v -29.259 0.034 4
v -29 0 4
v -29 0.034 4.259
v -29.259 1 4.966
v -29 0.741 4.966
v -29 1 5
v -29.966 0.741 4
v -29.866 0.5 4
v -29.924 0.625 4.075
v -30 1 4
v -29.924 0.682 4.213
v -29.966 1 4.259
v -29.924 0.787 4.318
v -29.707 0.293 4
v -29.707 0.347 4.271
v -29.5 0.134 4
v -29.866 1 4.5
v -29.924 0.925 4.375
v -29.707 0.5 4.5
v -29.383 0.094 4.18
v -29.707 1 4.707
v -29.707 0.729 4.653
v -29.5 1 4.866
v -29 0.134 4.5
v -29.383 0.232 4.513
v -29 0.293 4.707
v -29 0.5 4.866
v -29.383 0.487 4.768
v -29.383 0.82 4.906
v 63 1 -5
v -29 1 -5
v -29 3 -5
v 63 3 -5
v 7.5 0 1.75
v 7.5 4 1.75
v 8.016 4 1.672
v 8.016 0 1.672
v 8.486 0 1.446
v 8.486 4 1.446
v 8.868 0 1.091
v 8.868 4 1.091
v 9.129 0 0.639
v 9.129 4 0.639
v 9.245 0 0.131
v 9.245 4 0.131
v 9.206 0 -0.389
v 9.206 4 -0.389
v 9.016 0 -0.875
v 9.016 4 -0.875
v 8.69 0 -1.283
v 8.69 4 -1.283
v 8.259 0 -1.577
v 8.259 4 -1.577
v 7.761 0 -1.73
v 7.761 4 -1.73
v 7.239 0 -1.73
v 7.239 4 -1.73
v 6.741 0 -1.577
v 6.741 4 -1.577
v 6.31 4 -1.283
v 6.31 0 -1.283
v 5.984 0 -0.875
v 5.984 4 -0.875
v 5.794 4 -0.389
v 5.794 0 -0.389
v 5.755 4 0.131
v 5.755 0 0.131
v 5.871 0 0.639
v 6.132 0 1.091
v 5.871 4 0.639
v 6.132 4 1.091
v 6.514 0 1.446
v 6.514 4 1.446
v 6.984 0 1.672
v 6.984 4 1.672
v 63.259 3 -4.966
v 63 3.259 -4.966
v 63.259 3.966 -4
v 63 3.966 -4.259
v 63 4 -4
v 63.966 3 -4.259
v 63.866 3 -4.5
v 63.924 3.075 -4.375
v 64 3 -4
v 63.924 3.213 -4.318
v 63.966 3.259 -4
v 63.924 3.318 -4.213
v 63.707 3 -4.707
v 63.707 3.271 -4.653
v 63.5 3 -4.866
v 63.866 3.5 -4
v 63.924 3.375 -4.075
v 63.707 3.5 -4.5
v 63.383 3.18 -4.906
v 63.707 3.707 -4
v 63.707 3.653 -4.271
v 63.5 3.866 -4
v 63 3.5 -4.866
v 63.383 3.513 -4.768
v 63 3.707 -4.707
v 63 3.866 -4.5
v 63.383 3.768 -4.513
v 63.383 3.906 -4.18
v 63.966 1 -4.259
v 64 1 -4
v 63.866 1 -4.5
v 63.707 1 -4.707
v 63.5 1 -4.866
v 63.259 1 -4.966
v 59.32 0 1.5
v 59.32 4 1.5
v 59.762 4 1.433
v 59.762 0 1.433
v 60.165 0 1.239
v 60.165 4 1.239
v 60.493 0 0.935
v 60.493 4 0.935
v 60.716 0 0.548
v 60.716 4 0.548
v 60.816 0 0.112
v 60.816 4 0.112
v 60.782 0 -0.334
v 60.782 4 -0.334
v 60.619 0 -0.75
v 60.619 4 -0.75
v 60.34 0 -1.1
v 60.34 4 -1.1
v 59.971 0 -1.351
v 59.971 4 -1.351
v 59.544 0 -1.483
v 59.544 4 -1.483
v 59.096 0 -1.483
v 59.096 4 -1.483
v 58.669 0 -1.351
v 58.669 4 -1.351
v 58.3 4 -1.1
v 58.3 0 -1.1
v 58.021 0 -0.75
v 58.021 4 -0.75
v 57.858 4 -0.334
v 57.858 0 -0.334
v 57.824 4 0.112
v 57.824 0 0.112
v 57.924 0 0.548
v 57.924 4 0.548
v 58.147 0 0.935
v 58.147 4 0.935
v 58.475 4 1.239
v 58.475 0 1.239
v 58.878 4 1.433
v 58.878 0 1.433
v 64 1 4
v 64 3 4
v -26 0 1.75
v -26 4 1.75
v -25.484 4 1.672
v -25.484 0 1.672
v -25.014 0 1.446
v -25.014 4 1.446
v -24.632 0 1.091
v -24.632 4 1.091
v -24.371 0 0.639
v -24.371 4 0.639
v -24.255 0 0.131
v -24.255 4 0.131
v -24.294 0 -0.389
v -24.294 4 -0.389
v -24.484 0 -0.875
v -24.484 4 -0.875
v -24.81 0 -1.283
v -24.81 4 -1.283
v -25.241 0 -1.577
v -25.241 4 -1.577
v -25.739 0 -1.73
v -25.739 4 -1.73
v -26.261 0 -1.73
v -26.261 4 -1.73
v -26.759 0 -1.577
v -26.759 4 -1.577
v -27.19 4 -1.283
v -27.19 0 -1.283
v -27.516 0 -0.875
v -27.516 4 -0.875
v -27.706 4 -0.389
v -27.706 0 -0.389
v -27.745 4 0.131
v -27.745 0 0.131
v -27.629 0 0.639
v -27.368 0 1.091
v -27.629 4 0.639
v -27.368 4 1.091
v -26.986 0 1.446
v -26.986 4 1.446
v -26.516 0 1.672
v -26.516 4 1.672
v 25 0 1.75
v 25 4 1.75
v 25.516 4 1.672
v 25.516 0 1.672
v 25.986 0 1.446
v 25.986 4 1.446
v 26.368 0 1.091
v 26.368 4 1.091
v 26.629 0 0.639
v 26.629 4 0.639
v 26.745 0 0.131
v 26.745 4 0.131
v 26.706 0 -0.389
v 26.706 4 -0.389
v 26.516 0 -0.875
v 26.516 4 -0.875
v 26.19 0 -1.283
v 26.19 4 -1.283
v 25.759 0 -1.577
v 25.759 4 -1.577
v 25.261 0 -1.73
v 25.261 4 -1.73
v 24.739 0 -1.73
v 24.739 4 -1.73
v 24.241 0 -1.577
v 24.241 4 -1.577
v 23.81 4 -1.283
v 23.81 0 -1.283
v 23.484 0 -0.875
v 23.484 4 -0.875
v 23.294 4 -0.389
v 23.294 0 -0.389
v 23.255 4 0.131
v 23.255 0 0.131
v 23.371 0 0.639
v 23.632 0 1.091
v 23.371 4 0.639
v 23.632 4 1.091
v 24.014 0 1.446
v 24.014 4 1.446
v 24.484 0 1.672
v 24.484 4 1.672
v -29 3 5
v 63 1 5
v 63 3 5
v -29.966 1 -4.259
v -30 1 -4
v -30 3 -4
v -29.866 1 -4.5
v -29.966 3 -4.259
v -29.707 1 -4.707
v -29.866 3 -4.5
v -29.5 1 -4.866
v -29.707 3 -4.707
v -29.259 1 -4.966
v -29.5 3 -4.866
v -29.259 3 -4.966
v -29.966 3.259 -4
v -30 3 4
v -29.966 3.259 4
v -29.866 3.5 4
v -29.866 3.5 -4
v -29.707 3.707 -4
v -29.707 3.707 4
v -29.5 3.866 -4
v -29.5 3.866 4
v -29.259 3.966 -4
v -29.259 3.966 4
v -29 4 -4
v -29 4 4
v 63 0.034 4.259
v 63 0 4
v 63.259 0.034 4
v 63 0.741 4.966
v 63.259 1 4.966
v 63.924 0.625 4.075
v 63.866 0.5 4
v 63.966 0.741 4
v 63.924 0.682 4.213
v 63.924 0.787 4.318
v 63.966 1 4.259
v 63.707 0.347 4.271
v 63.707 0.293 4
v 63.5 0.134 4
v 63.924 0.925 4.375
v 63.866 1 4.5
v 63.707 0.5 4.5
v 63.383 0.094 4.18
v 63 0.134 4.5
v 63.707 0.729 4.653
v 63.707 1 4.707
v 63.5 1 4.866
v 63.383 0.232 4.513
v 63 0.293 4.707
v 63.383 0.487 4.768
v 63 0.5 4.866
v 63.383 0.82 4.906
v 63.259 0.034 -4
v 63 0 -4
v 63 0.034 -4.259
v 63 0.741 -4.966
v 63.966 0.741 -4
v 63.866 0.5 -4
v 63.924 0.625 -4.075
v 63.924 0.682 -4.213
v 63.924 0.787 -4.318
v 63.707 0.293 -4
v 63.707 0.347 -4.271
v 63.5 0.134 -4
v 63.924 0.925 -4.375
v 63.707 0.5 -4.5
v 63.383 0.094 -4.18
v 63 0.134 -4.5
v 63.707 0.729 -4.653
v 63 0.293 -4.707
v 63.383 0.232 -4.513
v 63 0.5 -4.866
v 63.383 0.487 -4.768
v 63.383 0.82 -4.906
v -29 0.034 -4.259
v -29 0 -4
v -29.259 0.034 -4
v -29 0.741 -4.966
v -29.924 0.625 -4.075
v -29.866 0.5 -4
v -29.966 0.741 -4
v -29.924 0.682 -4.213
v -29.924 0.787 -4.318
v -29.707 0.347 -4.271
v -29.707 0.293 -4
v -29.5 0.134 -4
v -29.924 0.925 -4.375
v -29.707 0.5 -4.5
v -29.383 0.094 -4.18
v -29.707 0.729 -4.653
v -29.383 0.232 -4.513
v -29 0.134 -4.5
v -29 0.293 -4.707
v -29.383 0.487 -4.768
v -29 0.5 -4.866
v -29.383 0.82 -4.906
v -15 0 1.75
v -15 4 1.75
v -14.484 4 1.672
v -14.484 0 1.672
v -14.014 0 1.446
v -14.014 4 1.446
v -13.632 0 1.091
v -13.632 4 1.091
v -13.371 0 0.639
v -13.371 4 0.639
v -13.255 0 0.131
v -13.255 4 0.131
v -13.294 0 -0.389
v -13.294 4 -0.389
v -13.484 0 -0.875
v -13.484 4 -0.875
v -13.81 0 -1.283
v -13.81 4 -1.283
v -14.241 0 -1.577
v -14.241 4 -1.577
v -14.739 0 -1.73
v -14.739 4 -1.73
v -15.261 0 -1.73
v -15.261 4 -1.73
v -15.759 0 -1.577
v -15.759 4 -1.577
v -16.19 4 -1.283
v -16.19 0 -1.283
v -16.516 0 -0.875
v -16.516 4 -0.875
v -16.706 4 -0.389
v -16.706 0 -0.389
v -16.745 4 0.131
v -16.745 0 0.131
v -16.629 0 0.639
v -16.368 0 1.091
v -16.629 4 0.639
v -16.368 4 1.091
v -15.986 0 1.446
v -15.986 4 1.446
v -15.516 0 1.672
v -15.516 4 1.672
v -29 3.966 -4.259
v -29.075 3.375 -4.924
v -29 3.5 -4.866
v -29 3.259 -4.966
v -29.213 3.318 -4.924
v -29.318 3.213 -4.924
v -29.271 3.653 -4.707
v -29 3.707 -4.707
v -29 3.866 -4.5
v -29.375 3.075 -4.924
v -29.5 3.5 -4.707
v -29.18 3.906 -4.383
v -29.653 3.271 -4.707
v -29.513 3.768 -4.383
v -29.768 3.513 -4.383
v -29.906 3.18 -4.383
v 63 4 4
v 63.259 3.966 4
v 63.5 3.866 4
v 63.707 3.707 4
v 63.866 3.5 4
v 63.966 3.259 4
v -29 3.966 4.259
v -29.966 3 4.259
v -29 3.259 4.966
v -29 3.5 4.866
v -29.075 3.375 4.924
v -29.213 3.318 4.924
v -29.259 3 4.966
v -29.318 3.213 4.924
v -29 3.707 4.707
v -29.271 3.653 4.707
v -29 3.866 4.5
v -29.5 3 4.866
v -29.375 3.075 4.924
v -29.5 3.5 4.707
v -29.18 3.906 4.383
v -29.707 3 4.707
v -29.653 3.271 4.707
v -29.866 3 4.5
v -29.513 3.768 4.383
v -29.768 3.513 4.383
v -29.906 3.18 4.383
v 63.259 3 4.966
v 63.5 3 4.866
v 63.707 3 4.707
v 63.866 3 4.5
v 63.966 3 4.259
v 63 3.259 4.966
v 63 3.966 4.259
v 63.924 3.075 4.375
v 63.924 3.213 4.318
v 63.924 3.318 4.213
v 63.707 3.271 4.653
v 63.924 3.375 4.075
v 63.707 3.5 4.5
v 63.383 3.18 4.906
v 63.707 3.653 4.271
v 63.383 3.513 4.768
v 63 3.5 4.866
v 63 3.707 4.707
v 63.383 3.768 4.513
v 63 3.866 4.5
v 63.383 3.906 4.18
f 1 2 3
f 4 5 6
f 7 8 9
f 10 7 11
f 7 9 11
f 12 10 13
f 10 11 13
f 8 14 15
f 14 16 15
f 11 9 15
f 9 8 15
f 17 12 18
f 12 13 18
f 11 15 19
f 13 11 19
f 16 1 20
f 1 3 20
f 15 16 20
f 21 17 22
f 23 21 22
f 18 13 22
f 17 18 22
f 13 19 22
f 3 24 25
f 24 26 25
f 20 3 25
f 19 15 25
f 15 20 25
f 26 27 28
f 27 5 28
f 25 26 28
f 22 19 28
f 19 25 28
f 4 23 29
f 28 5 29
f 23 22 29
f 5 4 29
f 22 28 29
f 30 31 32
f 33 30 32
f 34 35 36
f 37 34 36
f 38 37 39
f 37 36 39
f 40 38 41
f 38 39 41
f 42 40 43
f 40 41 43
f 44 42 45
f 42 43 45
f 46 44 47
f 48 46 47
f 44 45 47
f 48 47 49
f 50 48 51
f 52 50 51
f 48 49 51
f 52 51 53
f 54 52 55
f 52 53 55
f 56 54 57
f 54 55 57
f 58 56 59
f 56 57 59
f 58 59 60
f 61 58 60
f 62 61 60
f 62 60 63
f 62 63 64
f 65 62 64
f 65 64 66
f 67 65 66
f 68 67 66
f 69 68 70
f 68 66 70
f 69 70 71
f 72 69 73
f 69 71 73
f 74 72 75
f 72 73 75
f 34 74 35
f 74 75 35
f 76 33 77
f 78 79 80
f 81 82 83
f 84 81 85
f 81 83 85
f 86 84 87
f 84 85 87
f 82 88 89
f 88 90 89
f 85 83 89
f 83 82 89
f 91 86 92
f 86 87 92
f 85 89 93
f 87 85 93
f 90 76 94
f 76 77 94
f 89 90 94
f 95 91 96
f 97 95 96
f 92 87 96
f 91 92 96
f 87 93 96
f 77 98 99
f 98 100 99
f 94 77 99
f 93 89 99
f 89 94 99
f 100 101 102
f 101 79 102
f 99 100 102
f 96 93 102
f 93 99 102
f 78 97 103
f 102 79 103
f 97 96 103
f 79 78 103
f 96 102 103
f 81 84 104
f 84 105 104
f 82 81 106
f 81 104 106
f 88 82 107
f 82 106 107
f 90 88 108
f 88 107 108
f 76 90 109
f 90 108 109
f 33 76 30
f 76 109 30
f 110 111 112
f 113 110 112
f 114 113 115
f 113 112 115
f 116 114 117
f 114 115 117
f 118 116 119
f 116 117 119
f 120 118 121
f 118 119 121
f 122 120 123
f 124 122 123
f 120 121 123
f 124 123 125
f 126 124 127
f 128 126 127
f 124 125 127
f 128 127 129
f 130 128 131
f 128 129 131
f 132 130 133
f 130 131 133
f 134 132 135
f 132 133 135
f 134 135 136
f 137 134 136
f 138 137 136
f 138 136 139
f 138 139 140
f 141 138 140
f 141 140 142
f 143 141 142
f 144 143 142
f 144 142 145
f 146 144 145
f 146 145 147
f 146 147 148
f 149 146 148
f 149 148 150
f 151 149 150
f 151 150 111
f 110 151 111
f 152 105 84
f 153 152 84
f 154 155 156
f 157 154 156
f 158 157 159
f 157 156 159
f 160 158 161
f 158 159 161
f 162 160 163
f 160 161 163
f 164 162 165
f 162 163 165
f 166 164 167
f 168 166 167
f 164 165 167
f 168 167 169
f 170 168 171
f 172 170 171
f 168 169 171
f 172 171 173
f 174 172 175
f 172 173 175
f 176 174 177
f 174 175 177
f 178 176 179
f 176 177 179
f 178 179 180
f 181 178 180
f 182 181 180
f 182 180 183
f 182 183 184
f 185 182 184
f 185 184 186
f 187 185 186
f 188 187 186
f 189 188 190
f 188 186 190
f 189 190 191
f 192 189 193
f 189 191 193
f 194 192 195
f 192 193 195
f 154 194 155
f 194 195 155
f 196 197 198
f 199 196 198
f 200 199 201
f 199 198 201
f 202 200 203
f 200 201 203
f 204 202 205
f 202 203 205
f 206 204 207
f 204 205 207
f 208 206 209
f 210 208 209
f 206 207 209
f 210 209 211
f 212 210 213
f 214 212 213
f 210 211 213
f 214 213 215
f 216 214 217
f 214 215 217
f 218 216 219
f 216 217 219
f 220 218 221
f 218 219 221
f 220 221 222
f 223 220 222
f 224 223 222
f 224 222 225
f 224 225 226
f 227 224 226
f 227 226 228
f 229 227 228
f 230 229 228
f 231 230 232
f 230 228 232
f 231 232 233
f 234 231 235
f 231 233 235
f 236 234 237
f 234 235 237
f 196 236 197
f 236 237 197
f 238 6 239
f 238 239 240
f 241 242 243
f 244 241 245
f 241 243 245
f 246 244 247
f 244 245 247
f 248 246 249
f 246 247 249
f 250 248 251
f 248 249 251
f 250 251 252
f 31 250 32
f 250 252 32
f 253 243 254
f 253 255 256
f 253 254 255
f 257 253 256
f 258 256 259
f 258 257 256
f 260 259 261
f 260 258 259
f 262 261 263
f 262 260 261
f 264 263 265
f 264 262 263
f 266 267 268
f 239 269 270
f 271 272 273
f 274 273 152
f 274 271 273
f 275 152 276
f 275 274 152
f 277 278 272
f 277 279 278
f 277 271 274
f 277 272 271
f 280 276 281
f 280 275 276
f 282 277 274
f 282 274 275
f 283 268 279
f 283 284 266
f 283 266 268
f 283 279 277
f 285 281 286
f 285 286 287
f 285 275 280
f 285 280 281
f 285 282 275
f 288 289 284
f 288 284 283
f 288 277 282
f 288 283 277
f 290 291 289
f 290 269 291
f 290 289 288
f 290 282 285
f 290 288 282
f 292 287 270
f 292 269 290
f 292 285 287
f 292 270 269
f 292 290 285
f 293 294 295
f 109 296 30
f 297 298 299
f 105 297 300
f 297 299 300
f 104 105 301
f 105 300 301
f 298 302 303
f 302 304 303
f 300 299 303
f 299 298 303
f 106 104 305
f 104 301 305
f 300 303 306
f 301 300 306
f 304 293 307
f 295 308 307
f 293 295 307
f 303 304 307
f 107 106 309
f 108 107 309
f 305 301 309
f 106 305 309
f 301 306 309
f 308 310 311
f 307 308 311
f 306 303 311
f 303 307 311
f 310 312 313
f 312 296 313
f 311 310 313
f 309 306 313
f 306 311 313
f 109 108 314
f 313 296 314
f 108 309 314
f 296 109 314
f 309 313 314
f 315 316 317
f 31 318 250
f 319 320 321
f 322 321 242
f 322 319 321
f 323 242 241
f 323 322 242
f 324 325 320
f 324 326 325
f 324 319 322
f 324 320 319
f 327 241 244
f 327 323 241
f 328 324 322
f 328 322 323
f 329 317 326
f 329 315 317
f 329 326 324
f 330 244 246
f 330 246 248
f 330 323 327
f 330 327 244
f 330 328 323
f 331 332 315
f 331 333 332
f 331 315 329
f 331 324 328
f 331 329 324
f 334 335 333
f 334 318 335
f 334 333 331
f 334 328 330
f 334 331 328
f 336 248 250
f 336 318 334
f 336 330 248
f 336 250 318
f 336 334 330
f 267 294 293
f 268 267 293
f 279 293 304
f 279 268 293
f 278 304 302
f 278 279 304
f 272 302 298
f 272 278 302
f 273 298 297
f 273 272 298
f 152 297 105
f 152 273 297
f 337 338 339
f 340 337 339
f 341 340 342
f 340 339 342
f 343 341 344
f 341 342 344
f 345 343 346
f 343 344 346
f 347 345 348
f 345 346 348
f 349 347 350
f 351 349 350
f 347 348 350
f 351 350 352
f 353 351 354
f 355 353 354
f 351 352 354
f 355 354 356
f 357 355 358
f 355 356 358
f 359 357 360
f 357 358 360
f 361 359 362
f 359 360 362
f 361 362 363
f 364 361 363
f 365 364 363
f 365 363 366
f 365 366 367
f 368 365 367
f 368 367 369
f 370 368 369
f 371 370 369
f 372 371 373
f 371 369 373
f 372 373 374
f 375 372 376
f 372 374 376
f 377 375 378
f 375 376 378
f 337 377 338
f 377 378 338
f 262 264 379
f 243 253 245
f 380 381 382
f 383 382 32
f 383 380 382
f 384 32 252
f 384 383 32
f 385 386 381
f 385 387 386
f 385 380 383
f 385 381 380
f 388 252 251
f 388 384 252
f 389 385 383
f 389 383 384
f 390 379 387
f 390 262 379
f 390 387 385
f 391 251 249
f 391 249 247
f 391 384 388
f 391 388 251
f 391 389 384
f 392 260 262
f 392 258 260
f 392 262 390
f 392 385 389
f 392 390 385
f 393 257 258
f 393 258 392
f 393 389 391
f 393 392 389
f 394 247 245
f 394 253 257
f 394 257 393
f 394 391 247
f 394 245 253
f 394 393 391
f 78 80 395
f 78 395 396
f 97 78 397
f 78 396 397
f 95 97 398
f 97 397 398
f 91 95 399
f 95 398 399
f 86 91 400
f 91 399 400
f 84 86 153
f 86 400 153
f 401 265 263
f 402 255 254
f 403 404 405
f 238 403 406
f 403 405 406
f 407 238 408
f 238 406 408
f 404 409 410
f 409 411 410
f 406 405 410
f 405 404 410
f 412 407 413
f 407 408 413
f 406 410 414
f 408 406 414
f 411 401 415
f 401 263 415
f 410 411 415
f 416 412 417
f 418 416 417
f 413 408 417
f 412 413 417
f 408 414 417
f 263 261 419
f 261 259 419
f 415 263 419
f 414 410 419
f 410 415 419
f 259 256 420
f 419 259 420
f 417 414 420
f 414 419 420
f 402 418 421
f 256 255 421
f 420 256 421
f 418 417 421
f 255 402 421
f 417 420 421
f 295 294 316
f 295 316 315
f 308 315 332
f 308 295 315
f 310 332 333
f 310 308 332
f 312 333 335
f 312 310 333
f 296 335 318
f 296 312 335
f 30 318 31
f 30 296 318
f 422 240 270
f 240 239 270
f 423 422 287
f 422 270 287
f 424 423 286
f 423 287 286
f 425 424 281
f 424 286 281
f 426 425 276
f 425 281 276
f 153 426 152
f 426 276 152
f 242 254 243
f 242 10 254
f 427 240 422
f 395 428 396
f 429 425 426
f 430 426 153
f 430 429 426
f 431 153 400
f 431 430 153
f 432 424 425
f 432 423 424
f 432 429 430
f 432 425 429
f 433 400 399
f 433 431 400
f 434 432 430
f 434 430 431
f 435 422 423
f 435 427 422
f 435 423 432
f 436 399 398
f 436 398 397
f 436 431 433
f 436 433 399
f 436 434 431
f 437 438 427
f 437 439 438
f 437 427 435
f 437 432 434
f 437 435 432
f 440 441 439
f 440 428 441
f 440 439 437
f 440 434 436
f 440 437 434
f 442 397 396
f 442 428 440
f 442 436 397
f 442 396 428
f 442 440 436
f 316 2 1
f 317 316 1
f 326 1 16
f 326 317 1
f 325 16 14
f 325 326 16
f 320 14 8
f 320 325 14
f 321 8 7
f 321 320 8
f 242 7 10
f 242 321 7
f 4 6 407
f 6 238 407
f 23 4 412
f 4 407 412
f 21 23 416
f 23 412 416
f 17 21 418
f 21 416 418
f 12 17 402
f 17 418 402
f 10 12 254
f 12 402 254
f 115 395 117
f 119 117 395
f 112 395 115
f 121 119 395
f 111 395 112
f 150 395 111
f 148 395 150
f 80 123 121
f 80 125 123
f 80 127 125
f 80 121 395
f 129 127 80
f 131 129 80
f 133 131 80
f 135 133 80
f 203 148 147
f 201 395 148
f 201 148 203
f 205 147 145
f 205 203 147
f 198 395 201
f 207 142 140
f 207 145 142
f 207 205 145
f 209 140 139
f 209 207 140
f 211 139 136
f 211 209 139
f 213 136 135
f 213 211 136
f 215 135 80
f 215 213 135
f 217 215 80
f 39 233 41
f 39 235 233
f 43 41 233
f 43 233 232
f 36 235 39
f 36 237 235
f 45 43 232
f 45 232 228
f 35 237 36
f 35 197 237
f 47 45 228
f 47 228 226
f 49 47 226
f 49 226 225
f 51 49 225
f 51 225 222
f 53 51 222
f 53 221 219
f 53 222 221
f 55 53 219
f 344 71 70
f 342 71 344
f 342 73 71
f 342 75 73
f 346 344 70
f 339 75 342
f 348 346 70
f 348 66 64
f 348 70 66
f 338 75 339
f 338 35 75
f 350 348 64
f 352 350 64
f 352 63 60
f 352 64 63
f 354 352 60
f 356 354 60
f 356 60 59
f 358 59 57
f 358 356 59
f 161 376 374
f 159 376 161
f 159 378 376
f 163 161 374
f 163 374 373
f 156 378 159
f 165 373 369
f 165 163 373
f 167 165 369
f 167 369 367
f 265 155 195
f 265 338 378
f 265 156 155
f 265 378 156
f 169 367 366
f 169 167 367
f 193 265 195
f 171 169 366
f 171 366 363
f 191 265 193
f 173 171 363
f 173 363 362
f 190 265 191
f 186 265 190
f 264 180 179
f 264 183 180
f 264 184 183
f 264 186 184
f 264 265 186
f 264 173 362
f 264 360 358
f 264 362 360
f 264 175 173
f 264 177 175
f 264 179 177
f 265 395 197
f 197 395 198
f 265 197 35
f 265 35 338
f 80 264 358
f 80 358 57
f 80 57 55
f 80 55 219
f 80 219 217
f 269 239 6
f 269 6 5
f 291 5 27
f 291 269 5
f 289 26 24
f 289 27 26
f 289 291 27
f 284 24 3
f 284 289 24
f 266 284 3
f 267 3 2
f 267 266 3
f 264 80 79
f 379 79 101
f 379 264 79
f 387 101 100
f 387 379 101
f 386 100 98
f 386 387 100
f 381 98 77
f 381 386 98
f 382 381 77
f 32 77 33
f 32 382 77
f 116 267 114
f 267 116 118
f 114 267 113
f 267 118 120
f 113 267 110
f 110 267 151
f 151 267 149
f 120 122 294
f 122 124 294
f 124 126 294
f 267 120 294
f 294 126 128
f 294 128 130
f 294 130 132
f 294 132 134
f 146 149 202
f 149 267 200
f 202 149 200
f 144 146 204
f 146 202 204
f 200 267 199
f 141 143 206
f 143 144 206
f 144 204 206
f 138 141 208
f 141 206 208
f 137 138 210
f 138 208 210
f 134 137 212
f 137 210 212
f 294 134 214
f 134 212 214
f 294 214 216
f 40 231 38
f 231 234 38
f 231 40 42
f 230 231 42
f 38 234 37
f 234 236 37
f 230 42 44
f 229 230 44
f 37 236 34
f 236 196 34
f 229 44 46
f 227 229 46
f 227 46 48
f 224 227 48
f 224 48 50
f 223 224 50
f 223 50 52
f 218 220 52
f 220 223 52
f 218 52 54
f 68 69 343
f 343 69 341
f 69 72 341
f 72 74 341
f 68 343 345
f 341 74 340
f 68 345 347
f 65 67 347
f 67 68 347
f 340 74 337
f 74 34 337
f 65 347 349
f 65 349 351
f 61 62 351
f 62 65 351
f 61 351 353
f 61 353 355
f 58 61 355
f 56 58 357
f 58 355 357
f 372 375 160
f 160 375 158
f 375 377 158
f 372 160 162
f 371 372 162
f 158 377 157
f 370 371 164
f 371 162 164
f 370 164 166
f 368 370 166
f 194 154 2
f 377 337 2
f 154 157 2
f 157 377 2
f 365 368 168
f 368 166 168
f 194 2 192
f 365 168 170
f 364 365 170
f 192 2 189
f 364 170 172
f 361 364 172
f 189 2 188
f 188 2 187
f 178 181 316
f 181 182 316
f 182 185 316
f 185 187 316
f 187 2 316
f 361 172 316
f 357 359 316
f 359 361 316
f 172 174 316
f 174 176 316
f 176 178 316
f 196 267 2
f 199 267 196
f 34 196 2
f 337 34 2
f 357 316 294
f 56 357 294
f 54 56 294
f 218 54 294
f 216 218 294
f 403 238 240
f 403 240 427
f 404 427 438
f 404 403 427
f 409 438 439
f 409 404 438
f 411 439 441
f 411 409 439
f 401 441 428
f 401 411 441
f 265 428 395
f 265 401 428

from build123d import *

# Parameters (mm, degrees)
SKETCH1_W               = 60
SKETCH1_H               = 10
BOSS_EXTRUDE1_DEPTH     = 4
SKETCH2_R               = 1.75
CUT_EXTRUDE1_DEPTH      = 4
SKETCH3_W               = 10
SKETCH3_H               = 4
BOSS_EXTRUDE2_DEPTH     = 40
SKETCH4_R               = 1.5
CUT_EXTRUDE2_DEPTH      = 10
CUT_EXTRUDE3_DEPTH      = 71.823724839
CUT_EXTRUDE3_DEPTH_BACK = 71.823724839
SKETCH5_W               = 6
SKETCH5_H               = 4
FILLET1_R               = 1


with BuildPart() as part:
    # Sketch1 → Boss-Extrude1 (new body)
    with BuildSketch(Plane(origin=(0, 0, 0), x_dir=(1, 0, 0), z_dir=(0, 1, 0))):
        Rectangle(SKETCH1_W, SKETCH1_H)
    extrude(amount=BOSS_EXTRUDE1_DEPTH)

    # Sketch2 → Cut-Extrude1 (cut)
    with BuildSketch(Plane(origin=(0, 4, 0), x_dir=(1, 0, 0), z_dir=(0, 1, 0))):
        with Locations(Location((-26, 0, 0), (0, 0, 270))):
            Circle(SKETCH2_R)
        with Locations(Location((7.5, 0, 0), (0, 0, 270))):
            Circle(SKETCH2_R)
        with Locations(Location((25, 0, 0), (0, 0, 270))):
            Circle(SKETCH2_R)
        with Locations(Location((-15, 0, 0), (0, 0, 270))):
            Circle(SKETCH2_R)
    extrude(amount=-CUT_EXTRUDE1_DEPTH, mode=Mode.SUBTRACT)

    # Sketch3 → Boss-Extrude2 (add)
    with BuildSketch(Plane(origin=(30, 0, 0), x_dir=(0, 0, -1), z_dir=(1, 0, 0))):
        with Locations((0, 2)):
            Rectangle(SKETCH3_W, SKETCH3_H)
    extrude(amount=BOSS_EXTRUDE2_DEPTH)

    # Sketch4 → Cut-Extrude2 (cut)
    with BuildSketch(Plane(origin=(0, 4, 0), x_dir=(1, 0, 0), z_dir=(0, 1, 0))):
        with Locations(Location((59.32, 0, 0), (0, 0, 270))):
            Circle(SKETCH4_R)
    extrude(amount=-CUT_EXTRUDE2_DEPTH, mode=Mode.SUBTRACT)

    # Sketch5 → Cut-Extrude3 (cut, two sides: drawn at the far end of the back side and taken through both)
    with BuildSketch(Plane.XY.offset(5).offset(-CUT_EXTRUDE3_DEPTH_BACK)):
        with Locations((67, 2)):
            Rectangle(SKETCH5_W, SKETCH5_H)
    extrude(amount=CUT_EXTRUDE3_DEPTH + CUT_EXTRUDE3_DEPTH_BACK, mode=Mode.SUBTRACT)

    # Fillet1
    fillet1_edges = [part.edges().sort_by_distance(p)[0] for p in [
        (-30, 4, 0),
        (17, 4, 5),
        (17, 0, 5),
        (17, 0, -5),
        (17, 4, -5),
        (-30, 0, 0),
        (64, 0, 0),
        (64, 2, 5),
        (64, 2, -5),
        (64, 4, 0),
        (-30, 2, 5),
        (-30, 2, -5),
    ]]
    fillet(fillet1_edges, radius=FILLET1_R)


solid = part.part
